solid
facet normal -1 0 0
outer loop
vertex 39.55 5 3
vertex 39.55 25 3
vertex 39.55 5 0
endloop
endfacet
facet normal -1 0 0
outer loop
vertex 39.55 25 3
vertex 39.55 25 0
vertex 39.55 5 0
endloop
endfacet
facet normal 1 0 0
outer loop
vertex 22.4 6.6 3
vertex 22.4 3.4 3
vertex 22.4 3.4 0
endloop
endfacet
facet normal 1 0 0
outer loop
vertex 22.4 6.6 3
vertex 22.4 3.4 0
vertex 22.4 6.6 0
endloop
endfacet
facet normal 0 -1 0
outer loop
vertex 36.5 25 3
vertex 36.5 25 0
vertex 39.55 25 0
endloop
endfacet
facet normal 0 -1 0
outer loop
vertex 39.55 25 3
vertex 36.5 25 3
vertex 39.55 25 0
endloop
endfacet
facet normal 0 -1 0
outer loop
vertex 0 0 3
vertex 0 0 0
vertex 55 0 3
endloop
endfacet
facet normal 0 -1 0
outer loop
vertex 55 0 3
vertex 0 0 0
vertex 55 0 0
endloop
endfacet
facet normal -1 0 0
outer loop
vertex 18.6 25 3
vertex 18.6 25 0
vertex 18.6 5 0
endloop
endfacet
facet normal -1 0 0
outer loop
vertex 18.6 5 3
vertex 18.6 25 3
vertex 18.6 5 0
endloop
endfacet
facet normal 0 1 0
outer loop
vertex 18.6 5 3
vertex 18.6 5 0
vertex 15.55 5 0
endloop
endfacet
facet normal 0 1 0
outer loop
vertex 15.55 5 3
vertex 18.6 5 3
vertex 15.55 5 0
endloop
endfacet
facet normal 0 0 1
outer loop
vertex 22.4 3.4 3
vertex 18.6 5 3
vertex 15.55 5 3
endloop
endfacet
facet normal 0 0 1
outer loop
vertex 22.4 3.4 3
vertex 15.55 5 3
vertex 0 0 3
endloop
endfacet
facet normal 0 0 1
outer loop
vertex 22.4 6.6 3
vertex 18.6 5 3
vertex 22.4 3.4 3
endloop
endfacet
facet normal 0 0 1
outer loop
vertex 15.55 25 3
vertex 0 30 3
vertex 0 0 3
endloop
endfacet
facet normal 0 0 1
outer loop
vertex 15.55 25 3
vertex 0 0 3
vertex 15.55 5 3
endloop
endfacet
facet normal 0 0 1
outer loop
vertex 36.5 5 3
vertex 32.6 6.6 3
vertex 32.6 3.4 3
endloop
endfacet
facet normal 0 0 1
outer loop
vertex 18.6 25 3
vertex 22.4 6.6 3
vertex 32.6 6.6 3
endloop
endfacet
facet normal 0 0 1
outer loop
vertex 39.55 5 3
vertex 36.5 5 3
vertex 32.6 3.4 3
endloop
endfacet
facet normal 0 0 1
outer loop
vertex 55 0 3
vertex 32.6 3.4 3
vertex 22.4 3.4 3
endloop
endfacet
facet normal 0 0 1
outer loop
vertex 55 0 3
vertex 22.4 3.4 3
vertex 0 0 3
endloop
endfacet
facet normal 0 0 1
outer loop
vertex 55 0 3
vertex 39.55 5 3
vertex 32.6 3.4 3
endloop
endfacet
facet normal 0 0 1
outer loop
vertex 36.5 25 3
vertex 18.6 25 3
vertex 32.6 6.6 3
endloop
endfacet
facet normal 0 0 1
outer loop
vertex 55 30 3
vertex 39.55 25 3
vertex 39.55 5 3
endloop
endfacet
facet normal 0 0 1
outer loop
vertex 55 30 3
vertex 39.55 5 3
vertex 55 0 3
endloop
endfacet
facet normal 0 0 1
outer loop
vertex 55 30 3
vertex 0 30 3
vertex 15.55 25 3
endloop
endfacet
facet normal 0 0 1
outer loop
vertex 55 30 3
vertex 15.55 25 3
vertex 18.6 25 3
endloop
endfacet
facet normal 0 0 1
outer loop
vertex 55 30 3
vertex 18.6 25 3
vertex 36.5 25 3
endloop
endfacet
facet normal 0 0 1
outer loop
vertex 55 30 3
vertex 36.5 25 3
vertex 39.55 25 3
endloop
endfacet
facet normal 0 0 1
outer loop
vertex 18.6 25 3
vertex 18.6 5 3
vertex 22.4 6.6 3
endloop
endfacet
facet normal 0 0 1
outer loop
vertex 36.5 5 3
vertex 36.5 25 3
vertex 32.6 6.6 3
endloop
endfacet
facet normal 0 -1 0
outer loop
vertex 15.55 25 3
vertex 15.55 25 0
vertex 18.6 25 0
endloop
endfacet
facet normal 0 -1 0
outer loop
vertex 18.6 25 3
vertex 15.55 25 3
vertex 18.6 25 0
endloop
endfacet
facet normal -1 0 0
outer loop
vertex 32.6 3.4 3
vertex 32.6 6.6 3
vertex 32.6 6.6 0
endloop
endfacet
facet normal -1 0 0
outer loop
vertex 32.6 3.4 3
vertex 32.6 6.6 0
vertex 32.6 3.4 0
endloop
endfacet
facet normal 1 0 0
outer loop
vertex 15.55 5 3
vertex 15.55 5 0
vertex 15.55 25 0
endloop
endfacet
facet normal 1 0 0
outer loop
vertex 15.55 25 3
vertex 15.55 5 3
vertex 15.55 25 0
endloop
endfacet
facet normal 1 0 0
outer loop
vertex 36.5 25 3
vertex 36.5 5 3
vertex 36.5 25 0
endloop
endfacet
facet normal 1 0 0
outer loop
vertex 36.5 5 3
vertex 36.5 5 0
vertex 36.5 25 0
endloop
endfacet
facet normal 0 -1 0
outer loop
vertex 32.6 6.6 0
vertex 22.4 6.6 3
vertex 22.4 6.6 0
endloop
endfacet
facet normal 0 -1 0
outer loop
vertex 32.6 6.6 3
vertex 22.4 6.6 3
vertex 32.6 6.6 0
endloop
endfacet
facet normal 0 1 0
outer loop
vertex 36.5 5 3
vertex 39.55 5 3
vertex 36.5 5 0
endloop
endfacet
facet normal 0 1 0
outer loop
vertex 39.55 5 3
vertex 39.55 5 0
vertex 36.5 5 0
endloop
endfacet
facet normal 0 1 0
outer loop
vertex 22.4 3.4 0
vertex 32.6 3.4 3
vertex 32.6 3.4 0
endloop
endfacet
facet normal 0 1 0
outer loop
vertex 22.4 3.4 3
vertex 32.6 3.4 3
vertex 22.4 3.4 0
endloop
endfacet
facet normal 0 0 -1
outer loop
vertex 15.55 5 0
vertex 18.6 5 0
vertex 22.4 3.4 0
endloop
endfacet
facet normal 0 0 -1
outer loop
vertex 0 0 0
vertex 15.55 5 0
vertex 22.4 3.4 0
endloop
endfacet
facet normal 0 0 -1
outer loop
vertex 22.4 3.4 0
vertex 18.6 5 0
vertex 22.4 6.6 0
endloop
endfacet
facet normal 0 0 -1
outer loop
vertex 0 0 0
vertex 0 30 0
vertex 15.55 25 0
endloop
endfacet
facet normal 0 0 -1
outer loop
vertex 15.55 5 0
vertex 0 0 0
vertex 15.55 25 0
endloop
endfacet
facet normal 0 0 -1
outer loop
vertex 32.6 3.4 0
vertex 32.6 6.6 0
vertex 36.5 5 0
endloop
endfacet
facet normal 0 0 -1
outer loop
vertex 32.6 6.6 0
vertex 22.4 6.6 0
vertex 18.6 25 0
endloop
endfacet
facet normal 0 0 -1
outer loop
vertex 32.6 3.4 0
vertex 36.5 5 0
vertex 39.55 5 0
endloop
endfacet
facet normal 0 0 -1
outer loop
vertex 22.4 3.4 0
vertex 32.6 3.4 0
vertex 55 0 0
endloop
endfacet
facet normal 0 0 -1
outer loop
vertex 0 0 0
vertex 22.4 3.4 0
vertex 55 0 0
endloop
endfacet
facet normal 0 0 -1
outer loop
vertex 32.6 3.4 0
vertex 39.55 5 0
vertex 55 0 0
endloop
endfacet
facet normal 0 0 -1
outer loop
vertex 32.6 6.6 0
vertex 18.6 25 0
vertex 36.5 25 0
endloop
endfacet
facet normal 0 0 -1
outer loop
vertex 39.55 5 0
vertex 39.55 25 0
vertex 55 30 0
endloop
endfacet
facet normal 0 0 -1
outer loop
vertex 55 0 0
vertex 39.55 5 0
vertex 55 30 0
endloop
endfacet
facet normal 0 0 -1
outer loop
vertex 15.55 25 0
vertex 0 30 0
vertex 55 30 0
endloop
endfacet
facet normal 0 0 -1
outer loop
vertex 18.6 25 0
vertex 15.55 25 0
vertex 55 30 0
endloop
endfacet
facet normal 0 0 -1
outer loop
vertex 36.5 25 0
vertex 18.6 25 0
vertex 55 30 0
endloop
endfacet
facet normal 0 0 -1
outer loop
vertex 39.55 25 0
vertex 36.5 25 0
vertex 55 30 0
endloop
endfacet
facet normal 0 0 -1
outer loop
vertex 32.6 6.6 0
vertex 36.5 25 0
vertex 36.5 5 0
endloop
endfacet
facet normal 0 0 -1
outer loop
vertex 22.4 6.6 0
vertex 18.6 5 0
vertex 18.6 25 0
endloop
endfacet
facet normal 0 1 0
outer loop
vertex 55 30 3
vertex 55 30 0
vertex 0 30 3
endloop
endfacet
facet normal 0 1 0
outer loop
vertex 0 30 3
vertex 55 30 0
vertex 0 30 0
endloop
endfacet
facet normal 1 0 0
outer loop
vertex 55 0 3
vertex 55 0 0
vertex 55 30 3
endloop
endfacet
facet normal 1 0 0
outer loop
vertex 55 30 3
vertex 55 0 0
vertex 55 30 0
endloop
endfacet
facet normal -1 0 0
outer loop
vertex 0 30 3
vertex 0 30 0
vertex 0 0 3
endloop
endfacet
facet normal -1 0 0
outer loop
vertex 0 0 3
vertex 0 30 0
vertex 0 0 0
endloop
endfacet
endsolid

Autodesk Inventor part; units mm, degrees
ref_plane "YZ Plane" through (0, 0, 0) normal (1, 0, 0) x (0, 1, 0)
ref_plane "XZ Plane" through (0, 0, 0) normal (0, 1, 0) x (-1, 0, 0)
ref_plane "XY Plane" through (0, 0, 0) normal (0, 0, 1) x (1, 0, 0)
sketch "Sketch1" plane through (0, 0, 0) normal (0, 0, 1) x (1, 0, 0)
  line L0 (0, 0) -> (55, 0)
  line L1 (55, 0) -> (55, 30)
  line L2 (55, 30) -> (0, 30)
  line L3 (0, 30) -> (0, 0)
  line L4 (36.5, 25) -> (39.55, 25)
  line L5 (39.55, 25) -> (39.55, 5)
  line L6 (39.55, 5) -> (36.5, 5)
  line L7 (36.5, 5) -> (36.5, 25)
  line L8 (15.55, 25) -> (18.6, 25)
  line L9 (18.6, 25) -> (18.6, 5)
  line L10 (18.6, 5) -> (15.55, 5)
  line L11 (15.55, 5) -> (15.55, 25)
  line L12 (44.5, 25) -> (47.55, 25)
  line L13 (47.55, 25) -> (47.55, 5)
  line L14 (47.55, 5) -> (44.5, 5)
  line L15 (44.5, 5) -> (44.5, 25)
  point P0 (15.55, 15)
  point P1 (0, 15)
  point P2 (36.5, 15)
  point P3 (17.075, 5)
  point P4 (27.5, 30)
  dimension "d0" = 55
  dimension "d1" = 30
  dimension "d2" = 3.05
  dimension "d3" = 3.05
  dimension "d4" = 24
  dimension "d6" = 10
  dimension "d7" = 8.9
  dimension "d16" = 3.05
  dimension "d17" = 32
extrude "Extrusion1" add sketch "Sketch1" along normal blind 3 contours L3 L2 L1 L0 | L12 L13 L14 L15
sketch "Sketch2" plane through (0, 0, 3) normal (0, 0, 1) x (1, 0, 0)
  line L0 (22.4, 6.6) -> (32.6, 6.6)
  line L1 (32.6, 6.6) -> (32.6, 3.4)
  line L2 (32.6, 3.4) -> (22.4, 3.4)
  line L3 (22.4, 3.4) -> (22.4, 6.6)
  line L4 (22.4, 6.6) -> (32.6, 3.4) construction
  line L5 (32.6, 6.6) -> (22.4, 3.4) construction
  line L6 (55, 30) -> (0, 30) projected
  line L7 (0, 0) -> (55, 0) projected
  point P0 (27.5, 5)
  point P1 (27.5, 30)
  point P2 (27.5, 30)
  dimension "d11" = 3.2
  dimension "d12" = 10.2
  dimension "d15" = 5
extrude "Extrusion2" cut sketch "Sketch2" against normal blind 3
properties part number "Moving_rail"
